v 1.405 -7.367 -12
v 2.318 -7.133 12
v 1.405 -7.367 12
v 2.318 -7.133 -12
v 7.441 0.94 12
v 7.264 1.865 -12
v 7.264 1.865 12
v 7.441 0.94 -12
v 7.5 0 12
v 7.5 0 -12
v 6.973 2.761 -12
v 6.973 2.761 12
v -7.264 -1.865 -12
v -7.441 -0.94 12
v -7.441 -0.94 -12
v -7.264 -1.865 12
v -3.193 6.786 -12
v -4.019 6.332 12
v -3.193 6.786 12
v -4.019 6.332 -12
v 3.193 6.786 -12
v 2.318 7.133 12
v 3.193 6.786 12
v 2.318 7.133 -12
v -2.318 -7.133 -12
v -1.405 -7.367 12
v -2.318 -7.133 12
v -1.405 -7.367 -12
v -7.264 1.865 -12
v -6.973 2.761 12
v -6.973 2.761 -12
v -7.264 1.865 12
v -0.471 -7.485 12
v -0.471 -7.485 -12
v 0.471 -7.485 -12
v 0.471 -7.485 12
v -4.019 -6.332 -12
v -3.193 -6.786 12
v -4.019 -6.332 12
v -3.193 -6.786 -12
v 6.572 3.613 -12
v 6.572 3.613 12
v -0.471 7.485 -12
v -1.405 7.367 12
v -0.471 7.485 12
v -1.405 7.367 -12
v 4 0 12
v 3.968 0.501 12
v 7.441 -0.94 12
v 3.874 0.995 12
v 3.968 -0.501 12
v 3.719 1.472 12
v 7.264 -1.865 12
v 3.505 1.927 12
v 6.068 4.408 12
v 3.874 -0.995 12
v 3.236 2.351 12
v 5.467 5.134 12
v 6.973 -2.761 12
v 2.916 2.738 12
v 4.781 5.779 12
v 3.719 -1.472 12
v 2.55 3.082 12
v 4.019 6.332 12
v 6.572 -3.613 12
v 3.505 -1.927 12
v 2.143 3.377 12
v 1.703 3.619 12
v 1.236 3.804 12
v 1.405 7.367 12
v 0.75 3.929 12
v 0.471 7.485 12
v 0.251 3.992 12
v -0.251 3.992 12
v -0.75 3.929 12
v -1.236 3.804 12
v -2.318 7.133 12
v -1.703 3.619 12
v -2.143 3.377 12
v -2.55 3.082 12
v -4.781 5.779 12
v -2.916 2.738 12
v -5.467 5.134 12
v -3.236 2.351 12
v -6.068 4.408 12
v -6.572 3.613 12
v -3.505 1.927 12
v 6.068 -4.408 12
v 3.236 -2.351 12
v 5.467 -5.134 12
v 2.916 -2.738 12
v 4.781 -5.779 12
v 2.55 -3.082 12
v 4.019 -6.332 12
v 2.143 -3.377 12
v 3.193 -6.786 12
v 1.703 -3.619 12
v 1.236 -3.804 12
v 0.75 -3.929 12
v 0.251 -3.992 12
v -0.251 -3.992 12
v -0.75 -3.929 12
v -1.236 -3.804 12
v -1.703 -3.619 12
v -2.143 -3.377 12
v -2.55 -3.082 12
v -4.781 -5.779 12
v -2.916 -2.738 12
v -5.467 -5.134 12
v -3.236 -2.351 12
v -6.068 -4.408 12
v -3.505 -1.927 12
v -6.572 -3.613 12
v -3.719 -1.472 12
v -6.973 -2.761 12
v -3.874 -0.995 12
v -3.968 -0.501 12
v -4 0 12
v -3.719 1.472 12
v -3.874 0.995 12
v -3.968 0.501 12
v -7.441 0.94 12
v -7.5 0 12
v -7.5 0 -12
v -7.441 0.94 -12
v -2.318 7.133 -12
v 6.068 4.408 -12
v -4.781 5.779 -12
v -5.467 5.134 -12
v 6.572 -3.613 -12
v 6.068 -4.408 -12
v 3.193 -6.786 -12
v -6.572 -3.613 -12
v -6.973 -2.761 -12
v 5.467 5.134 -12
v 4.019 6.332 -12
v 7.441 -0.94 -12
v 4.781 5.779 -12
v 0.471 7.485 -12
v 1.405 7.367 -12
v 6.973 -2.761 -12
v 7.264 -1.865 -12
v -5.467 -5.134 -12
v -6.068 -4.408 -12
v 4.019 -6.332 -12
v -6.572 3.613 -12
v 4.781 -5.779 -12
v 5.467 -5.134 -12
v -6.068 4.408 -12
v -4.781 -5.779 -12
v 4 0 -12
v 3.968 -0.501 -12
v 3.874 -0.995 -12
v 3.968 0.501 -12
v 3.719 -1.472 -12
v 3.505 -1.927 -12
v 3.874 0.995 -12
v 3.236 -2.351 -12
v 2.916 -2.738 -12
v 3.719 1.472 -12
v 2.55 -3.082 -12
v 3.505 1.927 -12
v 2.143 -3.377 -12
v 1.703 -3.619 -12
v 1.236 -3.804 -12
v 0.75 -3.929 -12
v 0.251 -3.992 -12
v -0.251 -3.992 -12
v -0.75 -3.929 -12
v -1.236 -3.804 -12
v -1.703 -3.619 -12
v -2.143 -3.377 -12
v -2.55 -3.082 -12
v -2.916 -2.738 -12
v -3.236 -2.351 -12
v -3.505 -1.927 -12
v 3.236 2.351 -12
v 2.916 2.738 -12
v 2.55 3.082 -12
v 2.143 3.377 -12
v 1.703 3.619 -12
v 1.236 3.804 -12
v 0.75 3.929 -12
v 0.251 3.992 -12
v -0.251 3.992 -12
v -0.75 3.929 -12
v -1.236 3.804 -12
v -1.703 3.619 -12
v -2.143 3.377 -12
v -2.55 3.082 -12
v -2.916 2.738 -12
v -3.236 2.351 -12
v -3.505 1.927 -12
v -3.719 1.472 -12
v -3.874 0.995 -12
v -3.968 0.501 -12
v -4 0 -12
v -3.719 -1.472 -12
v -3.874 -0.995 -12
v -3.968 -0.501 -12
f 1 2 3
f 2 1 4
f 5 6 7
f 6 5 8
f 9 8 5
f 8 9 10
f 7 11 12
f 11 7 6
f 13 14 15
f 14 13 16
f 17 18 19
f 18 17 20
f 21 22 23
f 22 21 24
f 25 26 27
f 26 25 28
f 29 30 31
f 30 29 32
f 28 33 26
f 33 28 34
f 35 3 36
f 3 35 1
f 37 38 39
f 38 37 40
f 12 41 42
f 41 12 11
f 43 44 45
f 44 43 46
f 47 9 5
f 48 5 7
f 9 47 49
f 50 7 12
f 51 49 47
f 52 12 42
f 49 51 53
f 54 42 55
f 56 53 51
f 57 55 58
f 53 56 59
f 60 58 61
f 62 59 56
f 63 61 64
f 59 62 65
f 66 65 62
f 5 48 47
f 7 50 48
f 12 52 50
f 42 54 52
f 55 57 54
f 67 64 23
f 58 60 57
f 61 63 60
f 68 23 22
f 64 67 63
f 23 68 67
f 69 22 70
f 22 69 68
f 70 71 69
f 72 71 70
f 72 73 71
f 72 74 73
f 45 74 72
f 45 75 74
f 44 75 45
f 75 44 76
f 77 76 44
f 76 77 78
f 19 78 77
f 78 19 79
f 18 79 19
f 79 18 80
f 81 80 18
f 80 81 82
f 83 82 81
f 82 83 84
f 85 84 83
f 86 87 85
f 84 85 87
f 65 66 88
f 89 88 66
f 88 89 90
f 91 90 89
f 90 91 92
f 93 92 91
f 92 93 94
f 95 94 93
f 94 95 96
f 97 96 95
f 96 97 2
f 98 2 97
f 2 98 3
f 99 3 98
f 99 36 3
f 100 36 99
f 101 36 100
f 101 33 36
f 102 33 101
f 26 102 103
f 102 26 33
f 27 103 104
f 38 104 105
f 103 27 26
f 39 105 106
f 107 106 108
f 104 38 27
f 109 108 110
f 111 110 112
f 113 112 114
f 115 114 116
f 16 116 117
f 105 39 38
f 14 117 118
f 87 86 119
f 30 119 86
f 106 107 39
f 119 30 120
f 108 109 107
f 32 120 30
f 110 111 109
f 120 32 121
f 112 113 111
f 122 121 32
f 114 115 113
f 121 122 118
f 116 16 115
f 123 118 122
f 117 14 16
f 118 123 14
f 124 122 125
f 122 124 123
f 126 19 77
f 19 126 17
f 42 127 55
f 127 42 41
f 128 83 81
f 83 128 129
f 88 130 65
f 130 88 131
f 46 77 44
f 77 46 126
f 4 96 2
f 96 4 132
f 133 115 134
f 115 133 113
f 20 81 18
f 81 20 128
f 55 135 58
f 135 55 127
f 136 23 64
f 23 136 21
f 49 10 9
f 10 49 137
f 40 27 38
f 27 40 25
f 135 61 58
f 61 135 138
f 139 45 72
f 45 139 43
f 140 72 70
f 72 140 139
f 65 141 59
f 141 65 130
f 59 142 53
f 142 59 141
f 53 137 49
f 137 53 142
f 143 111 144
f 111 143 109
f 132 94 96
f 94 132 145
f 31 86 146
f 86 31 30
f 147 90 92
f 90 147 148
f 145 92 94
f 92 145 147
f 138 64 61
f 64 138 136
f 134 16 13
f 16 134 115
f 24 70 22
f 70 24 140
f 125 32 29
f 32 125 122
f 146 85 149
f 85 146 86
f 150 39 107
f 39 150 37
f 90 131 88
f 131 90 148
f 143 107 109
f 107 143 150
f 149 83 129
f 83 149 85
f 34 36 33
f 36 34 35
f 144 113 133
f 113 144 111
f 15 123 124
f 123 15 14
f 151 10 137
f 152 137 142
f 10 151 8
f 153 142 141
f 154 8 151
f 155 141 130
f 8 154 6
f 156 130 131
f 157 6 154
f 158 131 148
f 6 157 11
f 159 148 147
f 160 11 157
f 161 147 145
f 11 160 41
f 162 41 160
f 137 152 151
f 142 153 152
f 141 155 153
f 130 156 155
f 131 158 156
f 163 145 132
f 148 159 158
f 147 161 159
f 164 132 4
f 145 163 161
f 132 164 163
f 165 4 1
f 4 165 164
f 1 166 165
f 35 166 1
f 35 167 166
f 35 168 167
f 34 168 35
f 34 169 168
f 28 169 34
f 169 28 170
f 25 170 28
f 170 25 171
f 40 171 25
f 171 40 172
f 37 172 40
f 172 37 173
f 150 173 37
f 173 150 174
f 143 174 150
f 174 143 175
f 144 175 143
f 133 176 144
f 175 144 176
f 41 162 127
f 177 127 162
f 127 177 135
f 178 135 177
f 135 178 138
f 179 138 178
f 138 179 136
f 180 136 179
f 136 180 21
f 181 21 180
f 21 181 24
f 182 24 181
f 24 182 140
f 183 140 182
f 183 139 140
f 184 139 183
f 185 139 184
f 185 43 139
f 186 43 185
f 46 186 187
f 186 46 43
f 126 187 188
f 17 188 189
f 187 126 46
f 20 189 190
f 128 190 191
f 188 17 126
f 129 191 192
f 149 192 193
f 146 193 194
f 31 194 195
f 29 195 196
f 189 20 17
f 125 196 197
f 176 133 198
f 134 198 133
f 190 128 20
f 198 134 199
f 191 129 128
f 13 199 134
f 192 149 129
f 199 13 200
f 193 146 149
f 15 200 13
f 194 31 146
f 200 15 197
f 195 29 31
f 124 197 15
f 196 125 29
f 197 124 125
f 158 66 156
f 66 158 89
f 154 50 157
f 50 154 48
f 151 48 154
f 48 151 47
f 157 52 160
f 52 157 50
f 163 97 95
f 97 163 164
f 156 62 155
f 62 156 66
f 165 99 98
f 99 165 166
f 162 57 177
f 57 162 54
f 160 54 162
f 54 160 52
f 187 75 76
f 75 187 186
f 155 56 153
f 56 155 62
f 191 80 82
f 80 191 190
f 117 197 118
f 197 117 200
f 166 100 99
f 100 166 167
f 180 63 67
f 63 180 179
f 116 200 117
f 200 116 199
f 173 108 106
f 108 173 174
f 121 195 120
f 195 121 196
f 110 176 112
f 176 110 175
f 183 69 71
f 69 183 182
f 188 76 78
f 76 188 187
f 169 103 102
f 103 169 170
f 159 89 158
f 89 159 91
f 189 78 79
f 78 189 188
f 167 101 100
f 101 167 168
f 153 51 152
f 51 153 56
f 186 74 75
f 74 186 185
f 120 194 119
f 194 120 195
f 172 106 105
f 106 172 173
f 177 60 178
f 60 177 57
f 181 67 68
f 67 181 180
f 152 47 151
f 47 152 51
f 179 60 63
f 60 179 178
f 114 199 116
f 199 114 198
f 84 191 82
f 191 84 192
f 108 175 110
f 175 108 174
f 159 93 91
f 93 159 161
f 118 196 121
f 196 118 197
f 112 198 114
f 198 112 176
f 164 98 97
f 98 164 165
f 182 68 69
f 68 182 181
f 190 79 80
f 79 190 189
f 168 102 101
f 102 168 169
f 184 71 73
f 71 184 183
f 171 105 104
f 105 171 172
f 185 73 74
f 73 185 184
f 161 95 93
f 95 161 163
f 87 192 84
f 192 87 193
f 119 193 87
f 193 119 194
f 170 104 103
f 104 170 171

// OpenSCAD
$fn = 50;


difference() {
	union() {
		translate(v = [0, 0, -12.0000000000]) {
			cylinder(h = 24, r = 7.5000000000);
		}
	}
	union() {
		translate(v = [0, 0, -100.0000000000]) {
			cylinder(h = 200, r = 4.0000000000);
		}
	}
}
